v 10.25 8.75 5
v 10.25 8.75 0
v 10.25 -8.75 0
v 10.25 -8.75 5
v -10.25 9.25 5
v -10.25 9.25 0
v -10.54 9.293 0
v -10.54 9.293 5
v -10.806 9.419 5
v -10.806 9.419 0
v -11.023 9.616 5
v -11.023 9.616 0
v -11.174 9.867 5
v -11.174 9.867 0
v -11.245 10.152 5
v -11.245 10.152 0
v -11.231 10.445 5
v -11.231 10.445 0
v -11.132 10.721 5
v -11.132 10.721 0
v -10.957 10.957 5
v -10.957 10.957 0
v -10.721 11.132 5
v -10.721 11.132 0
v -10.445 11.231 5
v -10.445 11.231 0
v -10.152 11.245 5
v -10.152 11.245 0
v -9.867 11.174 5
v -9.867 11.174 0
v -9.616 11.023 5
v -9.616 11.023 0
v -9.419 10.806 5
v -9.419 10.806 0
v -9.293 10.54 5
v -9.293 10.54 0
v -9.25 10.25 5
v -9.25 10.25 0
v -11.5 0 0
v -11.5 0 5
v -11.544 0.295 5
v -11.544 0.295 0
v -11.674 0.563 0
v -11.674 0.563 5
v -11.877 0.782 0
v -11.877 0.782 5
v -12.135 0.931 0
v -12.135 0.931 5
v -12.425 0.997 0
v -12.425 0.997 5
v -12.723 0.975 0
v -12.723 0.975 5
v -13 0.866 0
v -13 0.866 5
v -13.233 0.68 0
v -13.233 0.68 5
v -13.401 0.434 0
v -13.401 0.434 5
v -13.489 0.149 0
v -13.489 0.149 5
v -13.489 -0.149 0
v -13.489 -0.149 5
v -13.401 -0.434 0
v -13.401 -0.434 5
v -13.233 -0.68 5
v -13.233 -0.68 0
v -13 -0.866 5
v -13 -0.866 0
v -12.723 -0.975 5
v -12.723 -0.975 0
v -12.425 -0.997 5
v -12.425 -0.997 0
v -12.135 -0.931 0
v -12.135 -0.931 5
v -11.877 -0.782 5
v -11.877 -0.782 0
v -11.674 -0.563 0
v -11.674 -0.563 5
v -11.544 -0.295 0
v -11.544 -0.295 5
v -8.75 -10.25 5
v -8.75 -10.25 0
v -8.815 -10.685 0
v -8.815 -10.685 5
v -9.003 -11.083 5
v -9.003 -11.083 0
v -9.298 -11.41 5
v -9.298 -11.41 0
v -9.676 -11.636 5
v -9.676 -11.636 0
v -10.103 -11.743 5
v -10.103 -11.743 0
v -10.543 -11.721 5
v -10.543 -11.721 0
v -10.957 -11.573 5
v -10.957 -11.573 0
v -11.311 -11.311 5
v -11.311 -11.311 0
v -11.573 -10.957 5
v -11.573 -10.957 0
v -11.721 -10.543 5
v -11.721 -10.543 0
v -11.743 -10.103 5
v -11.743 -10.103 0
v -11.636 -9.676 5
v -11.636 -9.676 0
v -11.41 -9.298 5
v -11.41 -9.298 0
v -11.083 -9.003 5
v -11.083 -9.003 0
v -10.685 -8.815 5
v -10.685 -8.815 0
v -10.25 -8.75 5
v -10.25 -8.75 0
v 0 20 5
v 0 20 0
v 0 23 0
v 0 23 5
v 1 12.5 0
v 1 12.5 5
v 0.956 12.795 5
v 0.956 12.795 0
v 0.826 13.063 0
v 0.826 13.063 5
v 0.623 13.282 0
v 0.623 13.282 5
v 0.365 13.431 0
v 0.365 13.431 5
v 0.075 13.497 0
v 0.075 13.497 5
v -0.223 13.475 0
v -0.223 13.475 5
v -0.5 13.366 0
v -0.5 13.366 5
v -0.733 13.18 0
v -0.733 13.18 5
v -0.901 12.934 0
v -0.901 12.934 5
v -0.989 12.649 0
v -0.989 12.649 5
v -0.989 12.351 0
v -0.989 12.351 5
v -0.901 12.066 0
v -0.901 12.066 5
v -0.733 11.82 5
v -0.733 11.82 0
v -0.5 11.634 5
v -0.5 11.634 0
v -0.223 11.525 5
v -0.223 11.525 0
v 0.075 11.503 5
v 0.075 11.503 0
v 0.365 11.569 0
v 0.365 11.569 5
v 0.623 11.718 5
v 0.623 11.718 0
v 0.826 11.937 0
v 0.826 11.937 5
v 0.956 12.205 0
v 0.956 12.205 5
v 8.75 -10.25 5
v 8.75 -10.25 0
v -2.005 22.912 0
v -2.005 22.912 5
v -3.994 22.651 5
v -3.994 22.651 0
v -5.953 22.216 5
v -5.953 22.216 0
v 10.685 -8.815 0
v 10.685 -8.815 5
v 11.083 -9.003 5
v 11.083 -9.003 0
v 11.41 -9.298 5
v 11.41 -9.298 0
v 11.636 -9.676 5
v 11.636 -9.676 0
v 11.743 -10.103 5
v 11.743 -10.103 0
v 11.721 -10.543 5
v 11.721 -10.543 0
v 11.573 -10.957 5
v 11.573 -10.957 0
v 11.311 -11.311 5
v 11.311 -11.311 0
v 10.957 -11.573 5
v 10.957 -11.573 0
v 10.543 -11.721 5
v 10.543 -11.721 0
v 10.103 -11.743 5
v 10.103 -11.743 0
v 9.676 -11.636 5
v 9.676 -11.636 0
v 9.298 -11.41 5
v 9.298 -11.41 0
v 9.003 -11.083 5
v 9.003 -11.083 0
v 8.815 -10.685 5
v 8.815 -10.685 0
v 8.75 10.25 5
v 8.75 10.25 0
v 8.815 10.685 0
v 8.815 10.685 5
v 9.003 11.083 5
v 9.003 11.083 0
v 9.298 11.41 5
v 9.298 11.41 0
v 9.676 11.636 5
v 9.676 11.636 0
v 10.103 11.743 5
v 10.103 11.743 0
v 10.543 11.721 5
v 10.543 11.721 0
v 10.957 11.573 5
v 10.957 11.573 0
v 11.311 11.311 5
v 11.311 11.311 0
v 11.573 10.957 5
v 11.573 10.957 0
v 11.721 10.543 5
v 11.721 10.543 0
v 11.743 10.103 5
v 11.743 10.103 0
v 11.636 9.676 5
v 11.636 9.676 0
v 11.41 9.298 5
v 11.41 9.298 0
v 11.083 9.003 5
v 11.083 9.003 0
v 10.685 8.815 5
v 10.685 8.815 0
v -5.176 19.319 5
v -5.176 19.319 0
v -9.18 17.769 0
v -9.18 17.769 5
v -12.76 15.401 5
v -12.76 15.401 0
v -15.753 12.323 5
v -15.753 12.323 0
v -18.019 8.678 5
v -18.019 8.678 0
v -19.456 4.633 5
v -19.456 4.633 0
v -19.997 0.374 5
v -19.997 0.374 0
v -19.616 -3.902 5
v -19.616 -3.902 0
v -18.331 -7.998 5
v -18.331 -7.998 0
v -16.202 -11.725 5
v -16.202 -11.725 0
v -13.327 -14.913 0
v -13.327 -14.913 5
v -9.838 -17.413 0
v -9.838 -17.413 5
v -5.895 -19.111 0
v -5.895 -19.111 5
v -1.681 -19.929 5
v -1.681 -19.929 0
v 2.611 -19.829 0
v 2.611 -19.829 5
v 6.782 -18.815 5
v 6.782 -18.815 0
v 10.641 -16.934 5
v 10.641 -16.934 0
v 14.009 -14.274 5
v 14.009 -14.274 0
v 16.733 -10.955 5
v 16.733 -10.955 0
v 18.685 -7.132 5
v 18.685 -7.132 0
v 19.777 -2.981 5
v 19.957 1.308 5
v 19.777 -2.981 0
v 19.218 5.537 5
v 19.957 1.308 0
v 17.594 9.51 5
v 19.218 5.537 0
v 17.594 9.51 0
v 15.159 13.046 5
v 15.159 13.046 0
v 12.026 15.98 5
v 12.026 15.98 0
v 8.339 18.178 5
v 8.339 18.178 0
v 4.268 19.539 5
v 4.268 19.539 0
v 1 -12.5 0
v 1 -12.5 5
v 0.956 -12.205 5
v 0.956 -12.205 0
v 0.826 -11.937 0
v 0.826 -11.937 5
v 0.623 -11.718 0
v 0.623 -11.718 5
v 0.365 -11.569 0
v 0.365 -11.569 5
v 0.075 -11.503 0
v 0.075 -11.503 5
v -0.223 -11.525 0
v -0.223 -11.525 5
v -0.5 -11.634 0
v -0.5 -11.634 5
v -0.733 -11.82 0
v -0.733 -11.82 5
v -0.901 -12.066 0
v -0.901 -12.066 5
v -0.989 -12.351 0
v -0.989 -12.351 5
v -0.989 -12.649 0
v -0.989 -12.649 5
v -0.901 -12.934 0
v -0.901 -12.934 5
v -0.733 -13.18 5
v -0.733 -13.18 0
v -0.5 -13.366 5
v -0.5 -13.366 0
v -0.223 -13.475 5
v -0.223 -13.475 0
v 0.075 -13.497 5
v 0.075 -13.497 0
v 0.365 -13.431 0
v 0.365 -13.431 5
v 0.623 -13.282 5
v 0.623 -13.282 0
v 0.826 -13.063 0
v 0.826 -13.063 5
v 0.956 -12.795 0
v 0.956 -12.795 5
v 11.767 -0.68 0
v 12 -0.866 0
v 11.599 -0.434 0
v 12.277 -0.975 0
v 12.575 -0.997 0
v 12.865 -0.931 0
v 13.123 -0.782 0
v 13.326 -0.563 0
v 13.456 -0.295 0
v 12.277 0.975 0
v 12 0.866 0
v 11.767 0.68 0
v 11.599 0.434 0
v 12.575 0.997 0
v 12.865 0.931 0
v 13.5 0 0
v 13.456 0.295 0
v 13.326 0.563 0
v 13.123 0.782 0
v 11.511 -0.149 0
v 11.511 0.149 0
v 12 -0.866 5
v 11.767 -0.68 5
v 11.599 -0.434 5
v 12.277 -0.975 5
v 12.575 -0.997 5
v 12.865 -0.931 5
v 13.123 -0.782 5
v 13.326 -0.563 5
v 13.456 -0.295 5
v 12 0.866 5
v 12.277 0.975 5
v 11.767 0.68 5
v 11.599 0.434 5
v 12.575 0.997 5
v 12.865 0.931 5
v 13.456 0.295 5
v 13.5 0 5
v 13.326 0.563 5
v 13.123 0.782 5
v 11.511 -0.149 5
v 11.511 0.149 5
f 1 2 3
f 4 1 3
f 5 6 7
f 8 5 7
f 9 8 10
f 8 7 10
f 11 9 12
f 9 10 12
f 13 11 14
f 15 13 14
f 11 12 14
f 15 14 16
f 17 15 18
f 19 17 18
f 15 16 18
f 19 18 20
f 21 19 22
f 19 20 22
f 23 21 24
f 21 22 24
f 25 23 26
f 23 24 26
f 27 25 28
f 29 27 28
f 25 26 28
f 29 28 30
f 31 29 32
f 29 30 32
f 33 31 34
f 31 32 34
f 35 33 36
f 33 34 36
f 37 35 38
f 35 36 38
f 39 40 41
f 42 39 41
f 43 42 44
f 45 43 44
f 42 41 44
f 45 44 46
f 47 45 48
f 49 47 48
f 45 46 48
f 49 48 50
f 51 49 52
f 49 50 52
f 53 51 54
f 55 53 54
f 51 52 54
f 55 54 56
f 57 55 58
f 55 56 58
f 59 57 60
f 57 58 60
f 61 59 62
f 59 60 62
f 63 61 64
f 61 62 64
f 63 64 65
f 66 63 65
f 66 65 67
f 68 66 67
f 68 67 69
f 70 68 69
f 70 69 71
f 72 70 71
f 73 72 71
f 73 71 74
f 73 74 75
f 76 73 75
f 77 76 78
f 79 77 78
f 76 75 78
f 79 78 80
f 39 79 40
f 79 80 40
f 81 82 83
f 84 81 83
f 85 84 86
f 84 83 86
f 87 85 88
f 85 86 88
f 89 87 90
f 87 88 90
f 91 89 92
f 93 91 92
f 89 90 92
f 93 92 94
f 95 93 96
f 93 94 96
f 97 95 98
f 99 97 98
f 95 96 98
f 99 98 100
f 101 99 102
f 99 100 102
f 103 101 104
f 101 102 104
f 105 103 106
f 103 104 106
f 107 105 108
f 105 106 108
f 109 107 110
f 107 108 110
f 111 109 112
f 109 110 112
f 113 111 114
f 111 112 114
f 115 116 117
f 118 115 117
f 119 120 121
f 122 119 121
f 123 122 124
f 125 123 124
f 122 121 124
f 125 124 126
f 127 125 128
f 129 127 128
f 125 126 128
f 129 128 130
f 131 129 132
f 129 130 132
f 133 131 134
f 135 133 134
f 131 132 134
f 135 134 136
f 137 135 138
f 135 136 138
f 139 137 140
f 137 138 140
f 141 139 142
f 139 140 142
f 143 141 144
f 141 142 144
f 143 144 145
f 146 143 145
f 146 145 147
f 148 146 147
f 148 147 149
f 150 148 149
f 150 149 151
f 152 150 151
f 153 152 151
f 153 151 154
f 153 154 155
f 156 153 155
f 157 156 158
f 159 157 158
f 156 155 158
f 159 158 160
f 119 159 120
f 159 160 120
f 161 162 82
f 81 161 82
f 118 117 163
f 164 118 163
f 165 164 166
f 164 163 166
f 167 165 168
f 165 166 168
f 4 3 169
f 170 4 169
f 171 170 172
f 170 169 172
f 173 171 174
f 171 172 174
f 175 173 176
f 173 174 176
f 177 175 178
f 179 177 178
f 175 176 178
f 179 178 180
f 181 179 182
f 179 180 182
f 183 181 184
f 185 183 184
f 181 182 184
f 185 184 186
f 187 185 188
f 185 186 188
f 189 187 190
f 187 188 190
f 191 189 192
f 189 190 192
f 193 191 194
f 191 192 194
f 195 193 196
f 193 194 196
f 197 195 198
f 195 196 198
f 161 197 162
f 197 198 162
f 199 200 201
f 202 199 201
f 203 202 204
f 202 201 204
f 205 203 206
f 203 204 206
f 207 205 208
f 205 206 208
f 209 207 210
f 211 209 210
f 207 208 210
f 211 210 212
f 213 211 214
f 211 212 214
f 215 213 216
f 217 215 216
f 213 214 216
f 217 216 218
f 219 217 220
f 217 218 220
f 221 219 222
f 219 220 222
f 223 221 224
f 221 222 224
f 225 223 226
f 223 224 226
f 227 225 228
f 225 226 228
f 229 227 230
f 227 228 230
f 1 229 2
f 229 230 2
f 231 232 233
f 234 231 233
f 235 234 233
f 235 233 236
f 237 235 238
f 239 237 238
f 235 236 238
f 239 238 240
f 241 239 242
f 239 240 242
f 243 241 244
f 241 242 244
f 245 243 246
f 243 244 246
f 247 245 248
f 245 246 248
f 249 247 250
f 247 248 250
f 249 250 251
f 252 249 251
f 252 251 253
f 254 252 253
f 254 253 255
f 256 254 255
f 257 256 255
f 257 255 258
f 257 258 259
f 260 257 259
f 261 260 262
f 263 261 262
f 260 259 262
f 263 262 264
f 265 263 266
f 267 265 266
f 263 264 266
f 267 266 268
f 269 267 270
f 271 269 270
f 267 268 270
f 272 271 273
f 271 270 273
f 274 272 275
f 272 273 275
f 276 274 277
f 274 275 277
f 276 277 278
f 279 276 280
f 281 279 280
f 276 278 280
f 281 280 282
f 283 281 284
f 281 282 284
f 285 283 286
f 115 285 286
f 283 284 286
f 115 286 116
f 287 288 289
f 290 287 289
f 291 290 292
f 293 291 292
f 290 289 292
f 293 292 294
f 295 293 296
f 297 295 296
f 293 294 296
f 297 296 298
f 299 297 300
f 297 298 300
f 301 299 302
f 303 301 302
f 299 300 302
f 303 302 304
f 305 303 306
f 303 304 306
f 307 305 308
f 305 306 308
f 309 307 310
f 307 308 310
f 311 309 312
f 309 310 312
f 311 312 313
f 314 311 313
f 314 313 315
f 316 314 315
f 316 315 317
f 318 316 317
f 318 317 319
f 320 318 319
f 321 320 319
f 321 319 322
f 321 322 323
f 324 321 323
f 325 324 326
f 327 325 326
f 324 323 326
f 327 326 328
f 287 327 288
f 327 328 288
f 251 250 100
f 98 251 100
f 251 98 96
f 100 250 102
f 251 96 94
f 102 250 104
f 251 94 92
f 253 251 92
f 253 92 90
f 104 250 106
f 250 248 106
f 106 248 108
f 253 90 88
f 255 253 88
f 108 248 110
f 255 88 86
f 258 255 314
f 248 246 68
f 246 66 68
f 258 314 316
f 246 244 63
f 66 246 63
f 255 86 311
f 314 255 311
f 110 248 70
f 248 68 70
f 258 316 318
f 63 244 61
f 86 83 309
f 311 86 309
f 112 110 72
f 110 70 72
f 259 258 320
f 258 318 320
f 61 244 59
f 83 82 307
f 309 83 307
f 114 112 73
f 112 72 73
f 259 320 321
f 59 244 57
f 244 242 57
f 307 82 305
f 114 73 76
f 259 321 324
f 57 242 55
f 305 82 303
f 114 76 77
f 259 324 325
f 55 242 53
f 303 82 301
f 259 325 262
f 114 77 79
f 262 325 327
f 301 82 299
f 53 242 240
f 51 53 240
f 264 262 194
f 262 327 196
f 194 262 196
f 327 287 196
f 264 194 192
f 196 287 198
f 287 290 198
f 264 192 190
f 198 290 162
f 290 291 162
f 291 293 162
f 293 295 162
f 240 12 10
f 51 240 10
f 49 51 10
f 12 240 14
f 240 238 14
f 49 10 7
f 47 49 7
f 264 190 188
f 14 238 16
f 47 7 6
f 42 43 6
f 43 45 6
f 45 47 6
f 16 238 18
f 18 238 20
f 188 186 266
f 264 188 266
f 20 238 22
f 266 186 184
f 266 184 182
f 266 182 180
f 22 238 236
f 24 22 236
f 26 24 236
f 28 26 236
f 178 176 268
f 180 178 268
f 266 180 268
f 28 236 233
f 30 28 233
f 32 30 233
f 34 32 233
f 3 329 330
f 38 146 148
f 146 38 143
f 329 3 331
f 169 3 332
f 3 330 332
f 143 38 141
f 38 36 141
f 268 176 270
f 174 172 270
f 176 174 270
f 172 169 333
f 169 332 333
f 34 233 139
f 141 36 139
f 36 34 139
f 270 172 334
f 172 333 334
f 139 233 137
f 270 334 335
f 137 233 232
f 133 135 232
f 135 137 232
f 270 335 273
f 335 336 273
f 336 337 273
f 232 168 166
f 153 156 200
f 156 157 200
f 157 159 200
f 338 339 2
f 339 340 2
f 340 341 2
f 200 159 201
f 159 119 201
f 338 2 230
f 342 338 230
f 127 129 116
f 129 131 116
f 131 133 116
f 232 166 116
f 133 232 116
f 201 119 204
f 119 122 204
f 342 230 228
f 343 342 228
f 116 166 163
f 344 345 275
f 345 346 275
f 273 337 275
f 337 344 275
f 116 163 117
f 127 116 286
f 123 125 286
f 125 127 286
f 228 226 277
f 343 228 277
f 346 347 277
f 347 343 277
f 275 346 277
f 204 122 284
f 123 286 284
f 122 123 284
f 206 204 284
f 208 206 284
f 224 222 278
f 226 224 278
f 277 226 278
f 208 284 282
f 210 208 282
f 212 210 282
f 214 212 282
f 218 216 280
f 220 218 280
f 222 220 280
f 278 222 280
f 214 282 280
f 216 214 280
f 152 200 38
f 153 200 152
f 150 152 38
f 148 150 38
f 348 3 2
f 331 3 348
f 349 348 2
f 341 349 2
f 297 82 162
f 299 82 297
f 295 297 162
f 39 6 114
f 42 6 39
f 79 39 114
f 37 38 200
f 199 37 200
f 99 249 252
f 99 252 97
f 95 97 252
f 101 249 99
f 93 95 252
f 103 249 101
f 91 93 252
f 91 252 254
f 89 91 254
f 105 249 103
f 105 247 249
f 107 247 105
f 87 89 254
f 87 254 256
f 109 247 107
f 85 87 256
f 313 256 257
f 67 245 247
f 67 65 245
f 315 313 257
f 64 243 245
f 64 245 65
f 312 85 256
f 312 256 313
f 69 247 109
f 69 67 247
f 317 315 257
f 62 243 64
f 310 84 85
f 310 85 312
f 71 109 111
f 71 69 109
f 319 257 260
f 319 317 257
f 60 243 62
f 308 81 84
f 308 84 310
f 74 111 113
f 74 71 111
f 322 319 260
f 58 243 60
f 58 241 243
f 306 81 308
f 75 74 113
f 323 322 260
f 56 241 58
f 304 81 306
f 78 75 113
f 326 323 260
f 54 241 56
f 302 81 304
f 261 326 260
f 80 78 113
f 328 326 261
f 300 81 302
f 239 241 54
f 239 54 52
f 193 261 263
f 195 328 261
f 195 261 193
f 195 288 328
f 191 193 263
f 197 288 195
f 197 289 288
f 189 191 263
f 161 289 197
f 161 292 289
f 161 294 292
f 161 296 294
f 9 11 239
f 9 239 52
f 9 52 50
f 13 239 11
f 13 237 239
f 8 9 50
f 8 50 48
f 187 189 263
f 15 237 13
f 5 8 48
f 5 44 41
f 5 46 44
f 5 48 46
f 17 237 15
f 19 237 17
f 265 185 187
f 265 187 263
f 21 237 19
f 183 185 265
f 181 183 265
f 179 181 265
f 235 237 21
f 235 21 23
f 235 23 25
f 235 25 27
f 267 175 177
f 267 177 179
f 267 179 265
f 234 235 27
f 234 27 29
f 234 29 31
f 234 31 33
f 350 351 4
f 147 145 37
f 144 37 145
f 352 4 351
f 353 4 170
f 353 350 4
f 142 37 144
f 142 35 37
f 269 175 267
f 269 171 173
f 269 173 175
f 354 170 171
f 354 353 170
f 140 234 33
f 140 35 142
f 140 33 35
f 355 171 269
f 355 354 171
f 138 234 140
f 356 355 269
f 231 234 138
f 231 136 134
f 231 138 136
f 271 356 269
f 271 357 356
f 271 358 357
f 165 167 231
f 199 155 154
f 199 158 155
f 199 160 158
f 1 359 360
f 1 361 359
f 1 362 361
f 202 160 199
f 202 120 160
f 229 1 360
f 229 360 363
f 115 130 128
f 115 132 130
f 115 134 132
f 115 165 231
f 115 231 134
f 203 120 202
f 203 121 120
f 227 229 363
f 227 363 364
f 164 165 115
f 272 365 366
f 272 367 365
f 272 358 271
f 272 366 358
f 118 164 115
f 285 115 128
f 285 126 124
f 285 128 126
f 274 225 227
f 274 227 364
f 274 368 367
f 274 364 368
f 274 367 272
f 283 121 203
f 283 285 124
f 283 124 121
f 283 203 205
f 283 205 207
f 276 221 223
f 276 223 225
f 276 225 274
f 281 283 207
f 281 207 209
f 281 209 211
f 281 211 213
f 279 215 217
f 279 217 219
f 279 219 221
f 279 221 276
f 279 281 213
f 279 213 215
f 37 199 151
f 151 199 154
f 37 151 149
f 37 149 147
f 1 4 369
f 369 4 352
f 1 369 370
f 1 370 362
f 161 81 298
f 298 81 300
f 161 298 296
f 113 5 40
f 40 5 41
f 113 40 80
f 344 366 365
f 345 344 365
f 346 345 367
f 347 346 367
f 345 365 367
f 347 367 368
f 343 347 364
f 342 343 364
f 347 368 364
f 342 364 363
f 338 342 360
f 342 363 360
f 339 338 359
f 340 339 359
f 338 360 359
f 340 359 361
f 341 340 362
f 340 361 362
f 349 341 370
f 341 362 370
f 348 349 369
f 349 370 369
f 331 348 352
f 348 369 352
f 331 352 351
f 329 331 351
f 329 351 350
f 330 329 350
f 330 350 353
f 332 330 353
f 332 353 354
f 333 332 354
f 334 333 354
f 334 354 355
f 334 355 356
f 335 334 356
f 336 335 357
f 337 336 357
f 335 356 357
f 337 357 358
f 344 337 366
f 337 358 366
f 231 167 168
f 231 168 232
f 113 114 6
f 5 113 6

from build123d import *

# Parameters (mm, degrees)
EXTRUDE_1_DEPTH     = 5
SKETCH_2_R          = 1
CUT_EXTRUDE_1_DEPTH = 5


with BuildPart() as part:
    # 草图1 → 凸台-拉伸1 (new body)
    with BuildSketch(Plane.XY):
        with BuildLine():
            ThreePointArc((0, 23), (-3.002102421, 22.803231812), (-5.952838037, 22.216294005))
            Line((-5.952838037, 22.216294005), (-5.176380902, 19.318516526))
            ThreePointArc((-5.176380902, 19.318516526), (2.610523844, -19.828897227), (0, 20))
            Line((0, 20), (0, 23))
        make_face()
        with BuildLine():
            Line((-9.25, 10.25), (8.75, 10.25))
            ThreePointArc((8.75, 10.25), (11.310660172, 11.310660172), (10.25, 8.75))
            Line((10.25, 8.75), (10.25, -8.75))
            ThreePointArc((10.25, -8.75), (11.310660172, -11.310660172), (8.75, -10.25))
            Line((8.75, -10.25), (-8.75, -10.25))
            ThreePointArc((-8.75, -10.25), (-11.310660172, -11.310660172), (-10.25, -8.75))
            Line((-10.25, -8.75), (-10.25, 9.25))
            ThreePointArc((-10.25, 9.25), (-10.957106781, 10.957106781), (-9.25, 10.25))
        make_face(mode=Mode.SUBTRACT)
    extrude(amount=EXTRUDE_1_DEPTH)

    # 草图2 → 切除-拉伸1 (cut)
    with BuildSketch(Plane.XY.offset(5)):
        with Locations((0, 12.5)):
            Circle(SKETCH_2_R)
        with Locations((12.5, 0)):
            Circle(SKETCH_2_R)
        with Locations((0, -12.5)):
            Circle(SKETCH_2_R)
        with Locations((-12.5, 0)):
            Circle(SKETCH_2_R)
    extrude(amount=-CUT_EXTRUDE_1_DEPTH, mode=Mode.SUBTRACT)


solid = part.part
